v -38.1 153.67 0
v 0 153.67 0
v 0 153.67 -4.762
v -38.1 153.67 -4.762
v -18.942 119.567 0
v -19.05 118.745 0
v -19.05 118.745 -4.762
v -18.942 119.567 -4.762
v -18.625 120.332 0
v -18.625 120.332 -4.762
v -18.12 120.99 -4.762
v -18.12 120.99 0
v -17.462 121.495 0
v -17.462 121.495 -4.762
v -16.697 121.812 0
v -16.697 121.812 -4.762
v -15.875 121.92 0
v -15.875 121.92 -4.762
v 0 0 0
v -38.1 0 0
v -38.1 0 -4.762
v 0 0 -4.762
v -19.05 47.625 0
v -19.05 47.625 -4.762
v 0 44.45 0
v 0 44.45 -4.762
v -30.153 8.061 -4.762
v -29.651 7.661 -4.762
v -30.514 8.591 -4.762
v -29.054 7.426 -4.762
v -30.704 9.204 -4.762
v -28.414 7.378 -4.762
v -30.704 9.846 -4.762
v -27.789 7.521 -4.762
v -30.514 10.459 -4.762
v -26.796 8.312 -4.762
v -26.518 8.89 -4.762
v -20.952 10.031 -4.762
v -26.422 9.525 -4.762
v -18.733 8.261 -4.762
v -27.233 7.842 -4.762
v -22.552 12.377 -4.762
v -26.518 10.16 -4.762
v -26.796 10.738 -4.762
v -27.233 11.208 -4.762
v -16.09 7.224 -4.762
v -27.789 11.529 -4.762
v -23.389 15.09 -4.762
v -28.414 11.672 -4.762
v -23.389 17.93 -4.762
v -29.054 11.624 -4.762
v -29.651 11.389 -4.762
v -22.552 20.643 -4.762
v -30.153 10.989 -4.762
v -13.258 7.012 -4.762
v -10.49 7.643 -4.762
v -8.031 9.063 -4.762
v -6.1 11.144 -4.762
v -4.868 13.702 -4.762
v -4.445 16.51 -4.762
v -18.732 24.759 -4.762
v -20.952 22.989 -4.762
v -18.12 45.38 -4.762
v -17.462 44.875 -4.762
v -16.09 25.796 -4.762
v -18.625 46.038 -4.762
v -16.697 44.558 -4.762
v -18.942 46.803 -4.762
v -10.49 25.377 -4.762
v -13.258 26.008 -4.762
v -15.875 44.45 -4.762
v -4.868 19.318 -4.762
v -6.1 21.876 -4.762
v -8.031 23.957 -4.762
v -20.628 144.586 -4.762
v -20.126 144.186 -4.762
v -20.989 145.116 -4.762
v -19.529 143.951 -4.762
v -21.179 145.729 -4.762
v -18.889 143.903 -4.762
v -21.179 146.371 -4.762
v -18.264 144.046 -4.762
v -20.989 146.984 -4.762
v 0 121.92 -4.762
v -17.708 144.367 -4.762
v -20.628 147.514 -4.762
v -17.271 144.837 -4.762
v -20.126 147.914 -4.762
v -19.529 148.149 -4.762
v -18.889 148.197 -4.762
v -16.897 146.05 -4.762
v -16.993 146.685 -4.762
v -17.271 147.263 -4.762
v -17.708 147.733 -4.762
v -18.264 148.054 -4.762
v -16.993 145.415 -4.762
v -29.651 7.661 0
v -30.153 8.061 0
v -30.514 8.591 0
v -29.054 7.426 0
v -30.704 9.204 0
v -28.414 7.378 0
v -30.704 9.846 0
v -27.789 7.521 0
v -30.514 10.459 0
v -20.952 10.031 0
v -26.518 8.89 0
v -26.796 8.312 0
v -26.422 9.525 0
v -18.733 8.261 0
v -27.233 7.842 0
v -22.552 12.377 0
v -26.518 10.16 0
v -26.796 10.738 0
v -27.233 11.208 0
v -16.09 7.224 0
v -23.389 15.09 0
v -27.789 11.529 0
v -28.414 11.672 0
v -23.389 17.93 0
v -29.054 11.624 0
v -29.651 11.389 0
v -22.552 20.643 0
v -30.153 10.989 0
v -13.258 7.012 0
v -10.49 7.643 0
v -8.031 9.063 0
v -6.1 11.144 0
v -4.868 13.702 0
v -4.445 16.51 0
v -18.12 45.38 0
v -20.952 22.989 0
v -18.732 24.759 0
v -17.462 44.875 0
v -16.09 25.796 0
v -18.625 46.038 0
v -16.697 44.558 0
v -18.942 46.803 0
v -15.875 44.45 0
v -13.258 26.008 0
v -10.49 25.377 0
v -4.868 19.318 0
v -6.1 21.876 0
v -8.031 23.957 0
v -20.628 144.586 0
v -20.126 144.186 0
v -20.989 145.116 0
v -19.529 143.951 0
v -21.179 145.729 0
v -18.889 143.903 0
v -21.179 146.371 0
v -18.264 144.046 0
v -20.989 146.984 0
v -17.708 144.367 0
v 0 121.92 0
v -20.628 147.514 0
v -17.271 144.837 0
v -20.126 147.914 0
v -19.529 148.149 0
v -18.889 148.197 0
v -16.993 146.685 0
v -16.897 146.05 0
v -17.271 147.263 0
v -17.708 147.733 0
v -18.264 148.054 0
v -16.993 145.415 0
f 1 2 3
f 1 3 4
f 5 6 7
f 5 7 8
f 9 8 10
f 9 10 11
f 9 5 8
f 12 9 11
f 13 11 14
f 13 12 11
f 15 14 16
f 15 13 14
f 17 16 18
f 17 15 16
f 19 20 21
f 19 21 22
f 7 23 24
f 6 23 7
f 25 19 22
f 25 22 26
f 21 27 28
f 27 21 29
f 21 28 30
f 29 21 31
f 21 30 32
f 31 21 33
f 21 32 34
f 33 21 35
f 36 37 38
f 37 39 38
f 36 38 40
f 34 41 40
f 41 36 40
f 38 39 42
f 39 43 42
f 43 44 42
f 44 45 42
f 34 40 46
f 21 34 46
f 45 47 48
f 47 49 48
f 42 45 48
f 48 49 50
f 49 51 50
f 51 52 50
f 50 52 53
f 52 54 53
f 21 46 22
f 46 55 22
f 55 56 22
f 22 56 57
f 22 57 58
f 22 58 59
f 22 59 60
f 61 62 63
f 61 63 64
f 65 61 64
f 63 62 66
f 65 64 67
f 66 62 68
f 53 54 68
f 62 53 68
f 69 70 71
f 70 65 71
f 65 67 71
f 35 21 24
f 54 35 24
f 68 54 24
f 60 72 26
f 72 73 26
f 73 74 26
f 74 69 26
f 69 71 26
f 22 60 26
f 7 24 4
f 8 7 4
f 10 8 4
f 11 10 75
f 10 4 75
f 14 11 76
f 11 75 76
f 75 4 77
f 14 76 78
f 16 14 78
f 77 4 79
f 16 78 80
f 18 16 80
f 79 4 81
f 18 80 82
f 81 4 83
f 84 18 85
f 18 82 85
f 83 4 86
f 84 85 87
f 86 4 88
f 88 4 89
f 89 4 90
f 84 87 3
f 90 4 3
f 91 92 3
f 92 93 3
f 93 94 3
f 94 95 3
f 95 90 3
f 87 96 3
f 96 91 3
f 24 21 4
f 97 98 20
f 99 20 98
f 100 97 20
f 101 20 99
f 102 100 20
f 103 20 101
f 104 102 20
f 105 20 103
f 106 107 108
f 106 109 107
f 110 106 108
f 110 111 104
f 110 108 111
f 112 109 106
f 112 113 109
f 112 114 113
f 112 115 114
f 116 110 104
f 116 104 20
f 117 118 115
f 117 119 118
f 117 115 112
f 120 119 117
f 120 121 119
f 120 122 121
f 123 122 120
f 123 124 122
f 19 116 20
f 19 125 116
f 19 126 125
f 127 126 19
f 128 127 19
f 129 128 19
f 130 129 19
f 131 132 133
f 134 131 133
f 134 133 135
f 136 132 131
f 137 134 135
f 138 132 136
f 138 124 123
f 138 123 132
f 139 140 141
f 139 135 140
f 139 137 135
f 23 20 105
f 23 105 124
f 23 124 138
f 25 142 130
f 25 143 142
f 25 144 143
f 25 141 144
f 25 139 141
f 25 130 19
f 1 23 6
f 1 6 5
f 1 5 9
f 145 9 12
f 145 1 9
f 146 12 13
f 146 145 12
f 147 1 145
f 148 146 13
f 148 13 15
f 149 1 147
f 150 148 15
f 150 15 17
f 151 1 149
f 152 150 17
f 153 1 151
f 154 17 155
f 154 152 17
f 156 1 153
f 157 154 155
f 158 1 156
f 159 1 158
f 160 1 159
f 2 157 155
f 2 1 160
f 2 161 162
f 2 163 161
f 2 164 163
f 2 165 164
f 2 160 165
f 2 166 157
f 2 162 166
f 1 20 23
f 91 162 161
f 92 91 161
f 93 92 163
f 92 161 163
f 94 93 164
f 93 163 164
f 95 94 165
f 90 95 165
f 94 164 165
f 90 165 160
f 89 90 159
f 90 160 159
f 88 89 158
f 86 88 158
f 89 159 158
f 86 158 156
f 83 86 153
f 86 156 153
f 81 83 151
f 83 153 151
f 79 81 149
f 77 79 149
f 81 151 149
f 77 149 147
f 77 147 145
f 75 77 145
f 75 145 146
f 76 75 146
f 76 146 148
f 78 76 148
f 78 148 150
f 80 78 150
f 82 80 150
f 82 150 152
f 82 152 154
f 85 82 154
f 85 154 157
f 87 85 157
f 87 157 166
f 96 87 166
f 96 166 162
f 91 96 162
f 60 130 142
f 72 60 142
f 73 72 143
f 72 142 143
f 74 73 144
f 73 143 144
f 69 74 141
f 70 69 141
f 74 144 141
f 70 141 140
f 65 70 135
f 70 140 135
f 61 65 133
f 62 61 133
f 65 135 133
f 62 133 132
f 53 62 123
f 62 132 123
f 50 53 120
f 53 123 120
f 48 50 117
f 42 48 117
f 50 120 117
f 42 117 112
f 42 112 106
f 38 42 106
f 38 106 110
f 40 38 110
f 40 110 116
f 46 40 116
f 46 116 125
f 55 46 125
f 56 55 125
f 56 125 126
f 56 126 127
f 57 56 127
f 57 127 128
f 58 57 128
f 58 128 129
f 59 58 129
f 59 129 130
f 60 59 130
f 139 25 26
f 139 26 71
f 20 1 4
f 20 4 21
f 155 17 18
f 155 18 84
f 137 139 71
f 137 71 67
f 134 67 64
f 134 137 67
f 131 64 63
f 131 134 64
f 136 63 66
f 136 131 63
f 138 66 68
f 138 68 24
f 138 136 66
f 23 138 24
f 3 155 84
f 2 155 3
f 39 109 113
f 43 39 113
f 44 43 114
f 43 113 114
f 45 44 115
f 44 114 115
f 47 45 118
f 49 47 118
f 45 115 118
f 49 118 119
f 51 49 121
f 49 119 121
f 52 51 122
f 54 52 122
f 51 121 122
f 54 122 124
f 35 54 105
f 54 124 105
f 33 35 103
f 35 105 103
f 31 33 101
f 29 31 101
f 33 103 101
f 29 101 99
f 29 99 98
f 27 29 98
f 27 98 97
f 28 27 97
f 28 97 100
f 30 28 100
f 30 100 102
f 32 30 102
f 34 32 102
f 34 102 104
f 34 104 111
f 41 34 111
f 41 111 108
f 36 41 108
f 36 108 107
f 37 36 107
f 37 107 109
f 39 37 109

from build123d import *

# Parameters (mm, degrees)
BOSS_EXTRUDE1_DEPTH         = 4.7625
F_6_CLEARANCE_HOLE1_D       = 4.3053
F_3_4_0_75_DIAMETER_HOLE1_D = 19.05


with BuildPart() as part:
    # Sketch1 → Boss-Extrude1 (new body)
    with BuildSketch(Plane.XY):
        with BuildLine():
            Line((0, 44.45), (-15.875, 44.45))
            ThreePointArc((-15.875, 44.45), (-18.12006403, 45.37993597), (-19.05, 47.625))
            Line((-19.05, 47.625), (-19.05, 118.745))
            ThreePointArc((-19.05, 118.745), (-18.12006403, 120.99006403), (-15.875, 121.92))
            Line((-15.875, 121.92), (0, 121.92))
            Line((0, 121.92), (0, 153.67))
            Line((0, 153.67), (-38.1, 153.67))
            Line((-38.1, 153.67), (-38.1, 0))
            Line((-38.1, 0), (0, 0))
            Line((0, 0), (0, 44.45))
        make_face()
    extrude(amount=-BOSS_EXTRUDE1_DEPTH)

    # #6 Clearance Hole1 (through all)
    with Locations(Plane(origin=(0, 0, -4.7625), x_dir=(-1, 0, 0), z_dir=(0, 0, -1))):
        with Locations((28.575, 9.525), (19.05, 146.05)):
            Hole(F_6_CLEARANCE_HOLE1_D / 2)

    # 3/4 (0.75) Diameter Hole1 (through all)
    with Locations(Plane(origin=(0, 0, -4.7625), x_dir=(-1, 0, 0), z_dir=(0, 0, -1))):
        with Locations((13.97, 16.51)):
            Hole(F_3_4_0_75_DIAMETER_HOLE1_D / 2)


solid = part.part
